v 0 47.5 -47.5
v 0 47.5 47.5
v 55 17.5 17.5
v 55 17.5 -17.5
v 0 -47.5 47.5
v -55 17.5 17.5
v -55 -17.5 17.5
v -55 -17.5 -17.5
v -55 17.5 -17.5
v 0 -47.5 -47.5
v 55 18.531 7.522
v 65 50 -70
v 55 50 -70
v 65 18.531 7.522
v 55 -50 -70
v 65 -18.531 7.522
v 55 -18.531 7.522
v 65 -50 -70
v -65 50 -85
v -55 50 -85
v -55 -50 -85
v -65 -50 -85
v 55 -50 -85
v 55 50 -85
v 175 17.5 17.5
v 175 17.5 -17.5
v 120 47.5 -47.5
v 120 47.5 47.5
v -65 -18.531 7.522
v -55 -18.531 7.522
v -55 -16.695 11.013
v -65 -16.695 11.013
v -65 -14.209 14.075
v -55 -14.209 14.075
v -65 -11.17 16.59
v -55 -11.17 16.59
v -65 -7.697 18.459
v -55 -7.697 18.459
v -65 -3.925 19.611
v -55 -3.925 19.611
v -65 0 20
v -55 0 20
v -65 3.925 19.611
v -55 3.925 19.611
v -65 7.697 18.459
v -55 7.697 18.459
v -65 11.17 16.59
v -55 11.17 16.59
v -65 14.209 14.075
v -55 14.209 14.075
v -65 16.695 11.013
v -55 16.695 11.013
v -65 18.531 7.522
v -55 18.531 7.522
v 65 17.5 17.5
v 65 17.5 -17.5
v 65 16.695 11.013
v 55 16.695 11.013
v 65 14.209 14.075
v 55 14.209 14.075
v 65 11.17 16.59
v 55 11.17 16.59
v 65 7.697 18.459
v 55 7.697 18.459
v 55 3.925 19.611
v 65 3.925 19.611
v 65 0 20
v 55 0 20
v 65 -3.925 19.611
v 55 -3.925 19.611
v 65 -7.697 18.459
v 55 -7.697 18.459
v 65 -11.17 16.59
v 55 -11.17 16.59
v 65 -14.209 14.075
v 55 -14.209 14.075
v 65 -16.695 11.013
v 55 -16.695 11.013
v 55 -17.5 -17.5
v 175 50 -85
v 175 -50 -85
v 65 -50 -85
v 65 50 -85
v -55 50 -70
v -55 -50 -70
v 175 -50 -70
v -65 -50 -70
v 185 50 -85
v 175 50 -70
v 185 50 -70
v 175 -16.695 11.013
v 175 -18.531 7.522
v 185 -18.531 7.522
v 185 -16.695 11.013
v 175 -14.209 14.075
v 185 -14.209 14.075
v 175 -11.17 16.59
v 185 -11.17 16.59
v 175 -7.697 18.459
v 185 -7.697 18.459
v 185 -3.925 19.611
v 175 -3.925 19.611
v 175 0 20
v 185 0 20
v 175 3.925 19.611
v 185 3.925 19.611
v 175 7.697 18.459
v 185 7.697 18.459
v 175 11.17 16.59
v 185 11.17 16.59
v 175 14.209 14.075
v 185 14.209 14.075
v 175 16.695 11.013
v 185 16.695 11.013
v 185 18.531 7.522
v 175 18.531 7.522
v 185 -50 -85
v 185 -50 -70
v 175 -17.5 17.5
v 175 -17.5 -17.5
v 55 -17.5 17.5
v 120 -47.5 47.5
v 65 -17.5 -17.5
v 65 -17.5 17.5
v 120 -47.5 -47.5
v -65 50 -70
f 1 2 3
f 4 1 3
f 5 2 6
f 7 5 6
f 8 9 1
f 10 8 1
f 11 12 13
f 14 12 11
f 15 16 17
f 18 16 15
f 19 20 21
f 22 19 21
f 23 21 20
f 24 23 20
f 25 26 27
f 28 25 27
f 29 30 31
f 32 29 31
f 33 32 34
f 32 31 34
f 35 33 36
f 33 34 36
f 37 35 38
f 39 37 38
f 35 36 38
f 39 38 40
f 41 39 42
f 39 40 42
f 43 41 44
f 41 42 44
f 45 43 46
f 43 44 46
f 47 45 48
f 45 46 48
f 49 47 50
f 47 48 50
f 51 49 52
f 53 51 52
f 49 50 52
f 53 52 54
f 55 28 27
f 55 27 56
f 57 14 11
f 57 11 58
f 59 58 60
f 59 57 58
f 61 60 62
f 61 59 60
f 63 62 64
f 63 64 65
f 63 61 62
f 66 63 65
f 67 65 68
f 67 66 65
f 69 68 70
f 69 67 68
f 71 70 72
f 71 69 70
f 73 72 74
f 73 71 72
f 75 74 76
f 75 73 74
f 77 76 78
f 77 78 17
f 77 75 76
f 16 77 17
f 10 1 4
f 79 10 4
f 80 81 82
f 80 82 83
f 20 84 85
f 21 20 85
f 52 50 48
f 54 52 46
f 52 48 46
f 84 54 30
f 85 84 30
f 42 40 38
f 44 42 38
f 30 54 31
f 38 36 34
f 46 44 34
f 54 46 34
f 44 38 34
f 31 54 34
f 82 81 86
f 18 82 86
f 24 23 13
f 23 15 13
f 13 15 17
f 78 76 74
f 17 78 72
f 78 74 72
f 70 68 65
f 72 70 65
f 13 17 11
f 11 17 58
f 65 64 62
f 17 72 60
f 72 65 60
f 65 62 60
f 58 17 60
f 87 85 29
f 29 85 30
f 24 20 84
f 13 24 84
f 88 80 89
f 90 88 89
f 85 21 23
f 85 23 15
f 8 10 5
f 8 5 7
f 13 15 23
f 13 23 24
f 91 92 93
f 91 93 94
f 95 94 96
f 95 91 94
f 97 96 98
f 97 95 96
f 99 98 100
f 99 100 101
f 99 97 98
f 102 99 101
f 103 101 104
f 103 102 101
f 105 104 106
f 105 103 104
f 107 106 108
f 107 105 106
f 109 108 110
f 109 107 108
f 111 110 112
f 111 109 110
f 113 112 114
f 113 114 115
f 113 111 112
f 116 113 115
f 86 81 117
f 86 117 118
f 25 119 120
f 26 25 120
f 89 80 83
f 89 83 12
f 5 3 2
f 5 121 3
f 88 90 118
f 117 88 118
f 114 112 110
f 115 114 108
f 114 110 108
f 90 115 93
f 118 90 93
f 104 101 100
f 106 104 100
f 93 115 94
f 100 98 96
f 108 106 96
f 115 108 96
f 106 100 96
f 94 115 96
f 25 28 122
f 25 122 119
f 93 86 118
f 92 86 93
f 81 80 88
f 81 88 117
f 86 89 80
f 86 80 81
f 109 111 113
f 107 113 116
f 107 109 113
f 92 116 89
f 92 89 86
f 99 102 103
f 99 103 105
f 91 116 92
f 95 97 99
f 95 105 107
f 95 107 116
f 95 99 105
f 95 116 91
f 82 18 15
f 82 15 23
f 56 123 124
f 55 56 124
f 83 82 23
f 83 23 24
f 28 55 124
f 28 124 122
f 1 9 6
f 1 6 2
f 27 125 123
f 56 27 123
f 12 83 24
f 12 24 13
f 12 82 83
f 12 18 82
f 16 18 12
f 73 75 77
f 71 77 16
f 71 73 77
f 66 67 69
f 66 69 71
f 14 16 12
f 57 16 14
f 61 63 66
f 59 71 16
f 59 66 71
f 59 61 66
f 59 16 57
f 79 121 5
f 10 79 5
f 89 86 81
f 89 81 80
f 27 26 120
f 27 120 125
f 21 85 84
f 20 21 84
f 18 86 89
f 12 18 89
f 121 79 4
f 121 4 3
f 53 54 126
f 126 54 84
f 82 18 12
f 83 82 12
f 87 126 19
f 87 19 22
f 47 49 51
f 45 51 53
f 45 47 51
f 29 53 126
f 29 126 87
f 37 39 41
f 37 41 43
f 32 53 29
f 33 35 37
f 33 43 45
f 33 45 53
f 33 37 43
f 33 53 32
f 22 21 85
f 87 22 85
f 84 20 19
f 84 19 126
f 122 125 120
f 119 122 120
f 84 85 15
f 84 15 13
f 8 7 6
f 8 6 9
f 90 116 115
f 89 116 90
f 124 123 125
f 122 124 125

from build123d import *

# Parameters (mm, degrees)
F3_DEPTH  = 47.5
F5_DEPTH  = 55
F6_W      = 100
F6_H      = 15
F7_DEPTH  = 10
F9_DEPTH  = 5
F10_W     = 100
F10_H     = 15
F11_DEPTH = 110


with BuildPart() as f3:
    # F2 (on Front) → F3 (new body, symmetric)
    with BuildSketch(Plane.XZ):
        Polygon((0, 47.5), (-55, 17.5), (-55, -17.5), (0, -47.5), (55, -17.5), (55, 17.5), align=None)
    extrude(amount=F3_DEPTH, both=True)

    # F4 (on Top) → F5 (cut, symmetric)
    with BuildSketch(Plane.XY):
        Polygon((-55, 17.5), (0, 47.5), (-55, 47.5), align=None)
        Polygon((55, 47.5), (0, 47.5), (55, 17.5), align=None)
        Polygon((55, -47.5), (55, -17.5), (0, -47.5), align=None)
        Polygon((0, -47.5), (-55, -17.5), (-55, -47.5), align=None)
    extrude(amount=F5_DEPTH, both=True, mode=Mode.SUBTRACT)


with BuildPart() as f7:
    # F6 (on face) → F7 (new body)
    with BuildSketch(Plane(origin=(-55, 0, 0), x_dir=(0, -1, 0), z_dir=(-1, 0, 0))):
        with BuildLine():
            Line((-18.5314059074, 7.522432791), (-50, -70))
            Line((-50, -70), (50, -70))
            Line((50, -70), (18.5314059074, 7.522432791))
            ThreePointArc((18.5314059074, 7.522432791), (0, 20), (-18.5314059074, 7.522432791))
        make_face()
        with Locations((0, -77.5)):
            Rectangle(F6_W, F6_H)
    extrude(amount=F7_DEPTH)


with BuildPart() as f9:
    # F8 (on face) → F9 (new body)
    with BuildSketch(Plane.YZ.offset(55)):
        with BuildLine():
            Line((-50, -85), (50, -85))
            Line((50, -85), (50, -70))
            Line((50, -70), (18.5314059074, 7.522432791))
            ThreePointArc((18.5314059074, 7.522432791), (0, 20), (-18.5314059074, 7.522432791))
            Line((-18.5314059074, 7.522432791), (-50, -70))
            Line((-50, -70), (-50, -85))
        make_face()
    extrude(amount=F9_DEPTH)

    # F13: F9 across face


with BuildPart() as f11:
    # F10 (on face) → F11 (new body, through all)
    with BuildSketch(Plane.YZ.offset(-55)):
        with Locations((0, -77.5)):
            Rectangle(F10_W, F10_H)
    extrude(amount=F11_DEPTH)


with BuildPart() as f12_1:
    # F12: instance of F3
    add(f3.part.mirror(Plane(origin=(60, 0, -43.3010786838), x_dir=(0, 1, 0), z_dir=(1, 0, 0))))


with BuildPart() as f12_2:
    # F12: instance of F7
    add(f7.part.mirror(Plane(origin=(60, 0, -43.3010786838), x_dir=(0, 1, 0), z_dir=(1, 0, 0))))


with BuildPart() as f12_3:
    # F12: instance of F11
    add(f11.part.mirror(Plane(origin=(60, 0, -43.3010786838), x_dir=(0, 1, 0), z_dir=(1, 0, 0))))


with BuildPart() as f9_1:
    add(f9.part)
    add(f9.part.mirror(Plane(origin=(60, 0, -43.3010786838), x_dir=(0, 1, 0), z_dir=(1, 0, 0))))


solid = Compound([f3.part, f7.part, f11.part, f12_1.part, f12_2.part, f12_3.part, f9_1.part])
